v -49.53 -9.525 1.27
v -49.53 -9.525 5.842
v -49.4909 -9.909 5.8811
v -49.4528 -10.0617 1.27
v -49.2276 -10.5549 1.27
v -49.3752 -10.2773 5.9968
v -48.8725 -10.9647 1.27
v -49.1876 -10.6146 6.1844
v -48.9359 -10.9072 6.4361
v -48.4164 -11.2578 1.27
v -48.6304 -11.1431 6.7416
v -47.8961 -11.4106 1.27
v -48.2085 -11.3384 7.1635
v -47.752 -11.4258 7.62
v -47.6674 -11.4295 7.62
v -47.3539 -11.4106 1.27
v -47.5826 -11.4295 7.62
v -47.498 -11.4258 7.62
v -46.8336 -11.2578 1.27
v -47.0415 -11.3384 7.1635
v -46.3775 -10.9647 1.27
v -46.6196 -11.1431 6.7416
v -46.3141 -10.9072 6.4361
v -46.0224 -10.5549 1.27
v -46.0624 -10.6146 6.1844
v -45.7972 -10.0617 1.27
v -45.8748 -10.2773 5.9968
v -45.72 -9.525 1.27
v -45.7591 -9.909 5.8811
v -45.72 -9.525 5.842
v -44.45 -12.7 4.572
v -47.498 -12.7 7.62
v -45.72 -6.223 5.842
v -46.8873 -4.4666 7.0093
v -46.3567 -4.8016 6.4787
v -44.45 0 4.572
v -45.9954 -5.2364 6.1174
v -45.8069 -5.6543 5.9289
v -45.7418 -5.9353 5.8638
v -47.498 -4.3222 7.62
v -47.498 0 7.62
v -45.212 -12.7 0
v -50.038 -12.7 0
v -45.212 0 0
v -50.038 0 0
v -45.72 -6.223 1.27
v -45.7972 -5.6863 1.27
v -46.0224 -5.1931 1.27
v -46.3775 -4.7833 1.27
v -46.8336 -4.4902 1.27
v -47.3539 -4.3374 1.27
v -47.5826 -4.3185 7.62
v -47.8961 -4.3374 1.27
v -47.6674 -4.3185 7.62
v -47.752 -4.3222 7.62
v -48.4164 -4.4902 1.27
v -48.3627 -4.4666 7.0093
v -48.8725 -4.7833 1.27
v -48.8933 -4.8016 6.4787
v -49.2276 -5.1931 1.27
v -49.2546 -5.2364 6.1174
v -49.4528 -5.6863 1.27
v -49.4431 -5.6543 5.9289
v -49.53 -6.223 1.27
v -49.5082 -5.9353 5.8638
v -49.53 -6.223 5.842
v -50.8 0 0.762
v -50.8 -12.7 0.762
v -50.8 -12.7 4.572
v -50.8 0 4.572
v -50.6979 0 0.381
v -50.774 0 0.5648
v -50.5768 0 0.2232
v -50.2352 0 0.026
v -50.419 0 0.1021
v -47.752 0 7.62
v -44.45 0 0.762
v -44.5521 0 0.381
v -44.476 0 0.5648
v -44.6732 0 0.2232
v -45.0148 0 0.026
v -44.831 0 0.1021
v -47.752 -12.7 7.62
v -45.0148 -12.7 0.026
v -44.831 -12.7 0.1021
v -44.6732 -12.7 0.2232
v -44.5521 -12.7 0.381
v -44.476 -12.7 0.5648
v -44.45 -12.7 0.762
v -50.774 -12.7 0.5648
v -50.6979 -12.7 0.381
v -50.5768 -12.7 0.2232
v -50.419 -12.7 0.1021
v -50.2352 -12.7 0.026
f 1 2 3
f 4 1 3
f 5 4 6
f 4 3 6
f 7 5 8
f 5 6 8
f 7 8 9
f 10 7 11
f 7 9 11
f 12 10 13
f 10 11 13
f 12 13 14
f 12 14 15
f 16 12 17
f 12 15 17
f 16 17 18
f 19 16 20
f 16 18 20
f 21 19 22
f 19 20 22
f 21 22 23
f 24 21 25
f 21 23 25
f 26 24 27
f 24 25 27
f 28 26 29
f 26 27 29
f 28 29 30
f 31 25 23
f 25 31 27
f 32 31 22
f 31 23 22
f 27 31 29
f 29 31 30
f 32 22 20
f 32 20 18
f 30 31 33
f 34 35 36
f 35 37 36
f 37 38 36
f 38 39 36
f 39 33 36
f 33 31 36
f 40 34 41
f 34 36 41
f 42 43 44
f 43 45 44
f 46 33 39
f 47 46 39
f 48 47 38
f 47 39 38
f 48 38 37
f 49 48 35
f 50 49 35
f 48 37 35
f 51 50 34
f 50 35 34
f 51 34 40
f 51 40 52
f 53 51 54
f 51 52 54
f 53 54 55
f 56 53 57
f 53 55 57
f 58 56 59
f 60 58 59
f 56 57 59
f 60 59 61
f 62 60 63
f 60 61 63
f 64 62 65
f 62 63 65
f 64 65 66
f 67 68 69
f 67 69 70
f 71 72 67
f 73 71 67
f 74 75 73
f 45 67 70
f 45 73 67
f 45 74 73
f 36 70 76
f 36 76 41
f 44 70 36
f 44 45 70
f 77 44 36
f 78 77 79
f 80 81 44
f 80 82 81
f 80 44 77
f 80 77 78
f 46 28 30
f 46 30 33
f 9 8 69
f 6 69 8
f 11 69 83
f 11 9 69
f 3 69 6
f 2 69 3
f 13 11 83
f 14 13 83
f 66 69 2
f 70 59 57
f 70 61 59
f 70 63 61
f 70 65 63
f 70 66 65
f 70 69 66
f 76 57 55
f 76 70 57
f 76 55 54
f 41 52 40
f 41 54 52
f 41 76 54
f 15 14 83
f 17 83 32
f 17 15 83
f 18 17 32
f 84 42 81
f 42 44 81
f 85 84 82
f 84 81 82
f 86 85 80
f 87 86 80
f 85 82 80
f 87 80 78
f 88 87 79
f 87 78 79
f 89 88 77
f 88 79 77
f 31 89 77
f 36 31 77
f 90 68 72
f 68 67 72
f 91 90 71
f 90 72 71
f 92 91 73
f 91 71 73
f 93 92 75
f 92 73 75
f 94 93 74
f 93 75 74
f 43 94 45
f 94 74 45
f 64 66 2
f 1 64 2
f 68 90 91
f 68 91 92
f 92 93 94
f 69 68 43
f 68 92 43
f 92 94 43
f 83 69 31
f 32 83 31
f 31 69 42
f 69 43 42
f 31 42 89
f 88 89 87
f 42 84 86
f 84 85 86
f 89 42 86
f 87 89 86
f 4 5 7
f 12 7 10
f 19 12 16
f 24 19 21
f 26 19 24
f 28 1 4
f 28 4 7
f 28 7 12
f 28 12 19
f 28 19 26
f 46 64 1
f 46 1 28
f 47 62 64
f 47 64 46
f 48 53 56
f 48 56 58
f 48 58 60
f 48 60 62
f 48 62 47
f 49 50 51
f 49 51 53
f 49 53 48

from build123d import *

# Parameters (mm, degrees)
F0_W        = 6.35
F0_H        = 12.7
F1_DEPTH    = 7.62
F3_DEPTH    = 6.35
F4_T1_DEPTH = 28.3769794946
F5_R        = 0.762


# Not quite as in the source:
# - a fillet or chamfer that OpenCascade refuses, or shapes differently, is made with other operations: its cross-section is extruded or revolved along the edge and cut away or added
# - a feature names something its author has since deleted; it is built from what else it names


with BuildPart() as f1:
    # F0 (on Top) → F1 (new body)
    with BuildSketch(Plane.XY):
        with Locations((-47.625, -6.35)):
            Rectangle(F0_W, F0_H)
    extrude(amount=F1_DEPTH)

    # F2 (on face) → F3 (cut)
    with BuildSketch(Plane.XY.offset(7.62)):
        with BuildLine():
            ThreePointArc((-45.72, -6.223), (-47.625, -4.318), (-49.53, -6.223))
            Line((-49.53, -6.223), (-49.53, -9.525))
            ThreePointArc((-49.53, -9.525), (-47.625, -11.43), (-45.72, -9.525))
            Line((-45.72, -9.525), (-45.72, -6.223))
        make_face()
    extrude(amount=-F3_DEPTH, mode=Mode.SUBTRACT)

    # F4: chamfer of 3.048 on 2 edges, made by hand

    # F4_s2 → F4_t1 (cut)
    with BuildSketch(Plane.XZ.offset(-7.8384897473)):
        Polygon((-50.8, 4.572), (-47.752, 7.62), (-50.8, 7.62), align=None)
        Polygon((-44.45, 4.572), (-47.498, 7.62), (-44.45, 7.62), align=None)
    extrude(amount=F4_T1_DEPTH, mode=Mode.SUBTRACT)

    # F5
    f5_edges = [f1.edges().sort_by_distance(p)[0] for p in [
        (-50.8, -6.35, 0),
        (-44.45, -6.35, 0),
    ]]
    fillet(f5_edges, radius=F5_R)


solid = f1.part
